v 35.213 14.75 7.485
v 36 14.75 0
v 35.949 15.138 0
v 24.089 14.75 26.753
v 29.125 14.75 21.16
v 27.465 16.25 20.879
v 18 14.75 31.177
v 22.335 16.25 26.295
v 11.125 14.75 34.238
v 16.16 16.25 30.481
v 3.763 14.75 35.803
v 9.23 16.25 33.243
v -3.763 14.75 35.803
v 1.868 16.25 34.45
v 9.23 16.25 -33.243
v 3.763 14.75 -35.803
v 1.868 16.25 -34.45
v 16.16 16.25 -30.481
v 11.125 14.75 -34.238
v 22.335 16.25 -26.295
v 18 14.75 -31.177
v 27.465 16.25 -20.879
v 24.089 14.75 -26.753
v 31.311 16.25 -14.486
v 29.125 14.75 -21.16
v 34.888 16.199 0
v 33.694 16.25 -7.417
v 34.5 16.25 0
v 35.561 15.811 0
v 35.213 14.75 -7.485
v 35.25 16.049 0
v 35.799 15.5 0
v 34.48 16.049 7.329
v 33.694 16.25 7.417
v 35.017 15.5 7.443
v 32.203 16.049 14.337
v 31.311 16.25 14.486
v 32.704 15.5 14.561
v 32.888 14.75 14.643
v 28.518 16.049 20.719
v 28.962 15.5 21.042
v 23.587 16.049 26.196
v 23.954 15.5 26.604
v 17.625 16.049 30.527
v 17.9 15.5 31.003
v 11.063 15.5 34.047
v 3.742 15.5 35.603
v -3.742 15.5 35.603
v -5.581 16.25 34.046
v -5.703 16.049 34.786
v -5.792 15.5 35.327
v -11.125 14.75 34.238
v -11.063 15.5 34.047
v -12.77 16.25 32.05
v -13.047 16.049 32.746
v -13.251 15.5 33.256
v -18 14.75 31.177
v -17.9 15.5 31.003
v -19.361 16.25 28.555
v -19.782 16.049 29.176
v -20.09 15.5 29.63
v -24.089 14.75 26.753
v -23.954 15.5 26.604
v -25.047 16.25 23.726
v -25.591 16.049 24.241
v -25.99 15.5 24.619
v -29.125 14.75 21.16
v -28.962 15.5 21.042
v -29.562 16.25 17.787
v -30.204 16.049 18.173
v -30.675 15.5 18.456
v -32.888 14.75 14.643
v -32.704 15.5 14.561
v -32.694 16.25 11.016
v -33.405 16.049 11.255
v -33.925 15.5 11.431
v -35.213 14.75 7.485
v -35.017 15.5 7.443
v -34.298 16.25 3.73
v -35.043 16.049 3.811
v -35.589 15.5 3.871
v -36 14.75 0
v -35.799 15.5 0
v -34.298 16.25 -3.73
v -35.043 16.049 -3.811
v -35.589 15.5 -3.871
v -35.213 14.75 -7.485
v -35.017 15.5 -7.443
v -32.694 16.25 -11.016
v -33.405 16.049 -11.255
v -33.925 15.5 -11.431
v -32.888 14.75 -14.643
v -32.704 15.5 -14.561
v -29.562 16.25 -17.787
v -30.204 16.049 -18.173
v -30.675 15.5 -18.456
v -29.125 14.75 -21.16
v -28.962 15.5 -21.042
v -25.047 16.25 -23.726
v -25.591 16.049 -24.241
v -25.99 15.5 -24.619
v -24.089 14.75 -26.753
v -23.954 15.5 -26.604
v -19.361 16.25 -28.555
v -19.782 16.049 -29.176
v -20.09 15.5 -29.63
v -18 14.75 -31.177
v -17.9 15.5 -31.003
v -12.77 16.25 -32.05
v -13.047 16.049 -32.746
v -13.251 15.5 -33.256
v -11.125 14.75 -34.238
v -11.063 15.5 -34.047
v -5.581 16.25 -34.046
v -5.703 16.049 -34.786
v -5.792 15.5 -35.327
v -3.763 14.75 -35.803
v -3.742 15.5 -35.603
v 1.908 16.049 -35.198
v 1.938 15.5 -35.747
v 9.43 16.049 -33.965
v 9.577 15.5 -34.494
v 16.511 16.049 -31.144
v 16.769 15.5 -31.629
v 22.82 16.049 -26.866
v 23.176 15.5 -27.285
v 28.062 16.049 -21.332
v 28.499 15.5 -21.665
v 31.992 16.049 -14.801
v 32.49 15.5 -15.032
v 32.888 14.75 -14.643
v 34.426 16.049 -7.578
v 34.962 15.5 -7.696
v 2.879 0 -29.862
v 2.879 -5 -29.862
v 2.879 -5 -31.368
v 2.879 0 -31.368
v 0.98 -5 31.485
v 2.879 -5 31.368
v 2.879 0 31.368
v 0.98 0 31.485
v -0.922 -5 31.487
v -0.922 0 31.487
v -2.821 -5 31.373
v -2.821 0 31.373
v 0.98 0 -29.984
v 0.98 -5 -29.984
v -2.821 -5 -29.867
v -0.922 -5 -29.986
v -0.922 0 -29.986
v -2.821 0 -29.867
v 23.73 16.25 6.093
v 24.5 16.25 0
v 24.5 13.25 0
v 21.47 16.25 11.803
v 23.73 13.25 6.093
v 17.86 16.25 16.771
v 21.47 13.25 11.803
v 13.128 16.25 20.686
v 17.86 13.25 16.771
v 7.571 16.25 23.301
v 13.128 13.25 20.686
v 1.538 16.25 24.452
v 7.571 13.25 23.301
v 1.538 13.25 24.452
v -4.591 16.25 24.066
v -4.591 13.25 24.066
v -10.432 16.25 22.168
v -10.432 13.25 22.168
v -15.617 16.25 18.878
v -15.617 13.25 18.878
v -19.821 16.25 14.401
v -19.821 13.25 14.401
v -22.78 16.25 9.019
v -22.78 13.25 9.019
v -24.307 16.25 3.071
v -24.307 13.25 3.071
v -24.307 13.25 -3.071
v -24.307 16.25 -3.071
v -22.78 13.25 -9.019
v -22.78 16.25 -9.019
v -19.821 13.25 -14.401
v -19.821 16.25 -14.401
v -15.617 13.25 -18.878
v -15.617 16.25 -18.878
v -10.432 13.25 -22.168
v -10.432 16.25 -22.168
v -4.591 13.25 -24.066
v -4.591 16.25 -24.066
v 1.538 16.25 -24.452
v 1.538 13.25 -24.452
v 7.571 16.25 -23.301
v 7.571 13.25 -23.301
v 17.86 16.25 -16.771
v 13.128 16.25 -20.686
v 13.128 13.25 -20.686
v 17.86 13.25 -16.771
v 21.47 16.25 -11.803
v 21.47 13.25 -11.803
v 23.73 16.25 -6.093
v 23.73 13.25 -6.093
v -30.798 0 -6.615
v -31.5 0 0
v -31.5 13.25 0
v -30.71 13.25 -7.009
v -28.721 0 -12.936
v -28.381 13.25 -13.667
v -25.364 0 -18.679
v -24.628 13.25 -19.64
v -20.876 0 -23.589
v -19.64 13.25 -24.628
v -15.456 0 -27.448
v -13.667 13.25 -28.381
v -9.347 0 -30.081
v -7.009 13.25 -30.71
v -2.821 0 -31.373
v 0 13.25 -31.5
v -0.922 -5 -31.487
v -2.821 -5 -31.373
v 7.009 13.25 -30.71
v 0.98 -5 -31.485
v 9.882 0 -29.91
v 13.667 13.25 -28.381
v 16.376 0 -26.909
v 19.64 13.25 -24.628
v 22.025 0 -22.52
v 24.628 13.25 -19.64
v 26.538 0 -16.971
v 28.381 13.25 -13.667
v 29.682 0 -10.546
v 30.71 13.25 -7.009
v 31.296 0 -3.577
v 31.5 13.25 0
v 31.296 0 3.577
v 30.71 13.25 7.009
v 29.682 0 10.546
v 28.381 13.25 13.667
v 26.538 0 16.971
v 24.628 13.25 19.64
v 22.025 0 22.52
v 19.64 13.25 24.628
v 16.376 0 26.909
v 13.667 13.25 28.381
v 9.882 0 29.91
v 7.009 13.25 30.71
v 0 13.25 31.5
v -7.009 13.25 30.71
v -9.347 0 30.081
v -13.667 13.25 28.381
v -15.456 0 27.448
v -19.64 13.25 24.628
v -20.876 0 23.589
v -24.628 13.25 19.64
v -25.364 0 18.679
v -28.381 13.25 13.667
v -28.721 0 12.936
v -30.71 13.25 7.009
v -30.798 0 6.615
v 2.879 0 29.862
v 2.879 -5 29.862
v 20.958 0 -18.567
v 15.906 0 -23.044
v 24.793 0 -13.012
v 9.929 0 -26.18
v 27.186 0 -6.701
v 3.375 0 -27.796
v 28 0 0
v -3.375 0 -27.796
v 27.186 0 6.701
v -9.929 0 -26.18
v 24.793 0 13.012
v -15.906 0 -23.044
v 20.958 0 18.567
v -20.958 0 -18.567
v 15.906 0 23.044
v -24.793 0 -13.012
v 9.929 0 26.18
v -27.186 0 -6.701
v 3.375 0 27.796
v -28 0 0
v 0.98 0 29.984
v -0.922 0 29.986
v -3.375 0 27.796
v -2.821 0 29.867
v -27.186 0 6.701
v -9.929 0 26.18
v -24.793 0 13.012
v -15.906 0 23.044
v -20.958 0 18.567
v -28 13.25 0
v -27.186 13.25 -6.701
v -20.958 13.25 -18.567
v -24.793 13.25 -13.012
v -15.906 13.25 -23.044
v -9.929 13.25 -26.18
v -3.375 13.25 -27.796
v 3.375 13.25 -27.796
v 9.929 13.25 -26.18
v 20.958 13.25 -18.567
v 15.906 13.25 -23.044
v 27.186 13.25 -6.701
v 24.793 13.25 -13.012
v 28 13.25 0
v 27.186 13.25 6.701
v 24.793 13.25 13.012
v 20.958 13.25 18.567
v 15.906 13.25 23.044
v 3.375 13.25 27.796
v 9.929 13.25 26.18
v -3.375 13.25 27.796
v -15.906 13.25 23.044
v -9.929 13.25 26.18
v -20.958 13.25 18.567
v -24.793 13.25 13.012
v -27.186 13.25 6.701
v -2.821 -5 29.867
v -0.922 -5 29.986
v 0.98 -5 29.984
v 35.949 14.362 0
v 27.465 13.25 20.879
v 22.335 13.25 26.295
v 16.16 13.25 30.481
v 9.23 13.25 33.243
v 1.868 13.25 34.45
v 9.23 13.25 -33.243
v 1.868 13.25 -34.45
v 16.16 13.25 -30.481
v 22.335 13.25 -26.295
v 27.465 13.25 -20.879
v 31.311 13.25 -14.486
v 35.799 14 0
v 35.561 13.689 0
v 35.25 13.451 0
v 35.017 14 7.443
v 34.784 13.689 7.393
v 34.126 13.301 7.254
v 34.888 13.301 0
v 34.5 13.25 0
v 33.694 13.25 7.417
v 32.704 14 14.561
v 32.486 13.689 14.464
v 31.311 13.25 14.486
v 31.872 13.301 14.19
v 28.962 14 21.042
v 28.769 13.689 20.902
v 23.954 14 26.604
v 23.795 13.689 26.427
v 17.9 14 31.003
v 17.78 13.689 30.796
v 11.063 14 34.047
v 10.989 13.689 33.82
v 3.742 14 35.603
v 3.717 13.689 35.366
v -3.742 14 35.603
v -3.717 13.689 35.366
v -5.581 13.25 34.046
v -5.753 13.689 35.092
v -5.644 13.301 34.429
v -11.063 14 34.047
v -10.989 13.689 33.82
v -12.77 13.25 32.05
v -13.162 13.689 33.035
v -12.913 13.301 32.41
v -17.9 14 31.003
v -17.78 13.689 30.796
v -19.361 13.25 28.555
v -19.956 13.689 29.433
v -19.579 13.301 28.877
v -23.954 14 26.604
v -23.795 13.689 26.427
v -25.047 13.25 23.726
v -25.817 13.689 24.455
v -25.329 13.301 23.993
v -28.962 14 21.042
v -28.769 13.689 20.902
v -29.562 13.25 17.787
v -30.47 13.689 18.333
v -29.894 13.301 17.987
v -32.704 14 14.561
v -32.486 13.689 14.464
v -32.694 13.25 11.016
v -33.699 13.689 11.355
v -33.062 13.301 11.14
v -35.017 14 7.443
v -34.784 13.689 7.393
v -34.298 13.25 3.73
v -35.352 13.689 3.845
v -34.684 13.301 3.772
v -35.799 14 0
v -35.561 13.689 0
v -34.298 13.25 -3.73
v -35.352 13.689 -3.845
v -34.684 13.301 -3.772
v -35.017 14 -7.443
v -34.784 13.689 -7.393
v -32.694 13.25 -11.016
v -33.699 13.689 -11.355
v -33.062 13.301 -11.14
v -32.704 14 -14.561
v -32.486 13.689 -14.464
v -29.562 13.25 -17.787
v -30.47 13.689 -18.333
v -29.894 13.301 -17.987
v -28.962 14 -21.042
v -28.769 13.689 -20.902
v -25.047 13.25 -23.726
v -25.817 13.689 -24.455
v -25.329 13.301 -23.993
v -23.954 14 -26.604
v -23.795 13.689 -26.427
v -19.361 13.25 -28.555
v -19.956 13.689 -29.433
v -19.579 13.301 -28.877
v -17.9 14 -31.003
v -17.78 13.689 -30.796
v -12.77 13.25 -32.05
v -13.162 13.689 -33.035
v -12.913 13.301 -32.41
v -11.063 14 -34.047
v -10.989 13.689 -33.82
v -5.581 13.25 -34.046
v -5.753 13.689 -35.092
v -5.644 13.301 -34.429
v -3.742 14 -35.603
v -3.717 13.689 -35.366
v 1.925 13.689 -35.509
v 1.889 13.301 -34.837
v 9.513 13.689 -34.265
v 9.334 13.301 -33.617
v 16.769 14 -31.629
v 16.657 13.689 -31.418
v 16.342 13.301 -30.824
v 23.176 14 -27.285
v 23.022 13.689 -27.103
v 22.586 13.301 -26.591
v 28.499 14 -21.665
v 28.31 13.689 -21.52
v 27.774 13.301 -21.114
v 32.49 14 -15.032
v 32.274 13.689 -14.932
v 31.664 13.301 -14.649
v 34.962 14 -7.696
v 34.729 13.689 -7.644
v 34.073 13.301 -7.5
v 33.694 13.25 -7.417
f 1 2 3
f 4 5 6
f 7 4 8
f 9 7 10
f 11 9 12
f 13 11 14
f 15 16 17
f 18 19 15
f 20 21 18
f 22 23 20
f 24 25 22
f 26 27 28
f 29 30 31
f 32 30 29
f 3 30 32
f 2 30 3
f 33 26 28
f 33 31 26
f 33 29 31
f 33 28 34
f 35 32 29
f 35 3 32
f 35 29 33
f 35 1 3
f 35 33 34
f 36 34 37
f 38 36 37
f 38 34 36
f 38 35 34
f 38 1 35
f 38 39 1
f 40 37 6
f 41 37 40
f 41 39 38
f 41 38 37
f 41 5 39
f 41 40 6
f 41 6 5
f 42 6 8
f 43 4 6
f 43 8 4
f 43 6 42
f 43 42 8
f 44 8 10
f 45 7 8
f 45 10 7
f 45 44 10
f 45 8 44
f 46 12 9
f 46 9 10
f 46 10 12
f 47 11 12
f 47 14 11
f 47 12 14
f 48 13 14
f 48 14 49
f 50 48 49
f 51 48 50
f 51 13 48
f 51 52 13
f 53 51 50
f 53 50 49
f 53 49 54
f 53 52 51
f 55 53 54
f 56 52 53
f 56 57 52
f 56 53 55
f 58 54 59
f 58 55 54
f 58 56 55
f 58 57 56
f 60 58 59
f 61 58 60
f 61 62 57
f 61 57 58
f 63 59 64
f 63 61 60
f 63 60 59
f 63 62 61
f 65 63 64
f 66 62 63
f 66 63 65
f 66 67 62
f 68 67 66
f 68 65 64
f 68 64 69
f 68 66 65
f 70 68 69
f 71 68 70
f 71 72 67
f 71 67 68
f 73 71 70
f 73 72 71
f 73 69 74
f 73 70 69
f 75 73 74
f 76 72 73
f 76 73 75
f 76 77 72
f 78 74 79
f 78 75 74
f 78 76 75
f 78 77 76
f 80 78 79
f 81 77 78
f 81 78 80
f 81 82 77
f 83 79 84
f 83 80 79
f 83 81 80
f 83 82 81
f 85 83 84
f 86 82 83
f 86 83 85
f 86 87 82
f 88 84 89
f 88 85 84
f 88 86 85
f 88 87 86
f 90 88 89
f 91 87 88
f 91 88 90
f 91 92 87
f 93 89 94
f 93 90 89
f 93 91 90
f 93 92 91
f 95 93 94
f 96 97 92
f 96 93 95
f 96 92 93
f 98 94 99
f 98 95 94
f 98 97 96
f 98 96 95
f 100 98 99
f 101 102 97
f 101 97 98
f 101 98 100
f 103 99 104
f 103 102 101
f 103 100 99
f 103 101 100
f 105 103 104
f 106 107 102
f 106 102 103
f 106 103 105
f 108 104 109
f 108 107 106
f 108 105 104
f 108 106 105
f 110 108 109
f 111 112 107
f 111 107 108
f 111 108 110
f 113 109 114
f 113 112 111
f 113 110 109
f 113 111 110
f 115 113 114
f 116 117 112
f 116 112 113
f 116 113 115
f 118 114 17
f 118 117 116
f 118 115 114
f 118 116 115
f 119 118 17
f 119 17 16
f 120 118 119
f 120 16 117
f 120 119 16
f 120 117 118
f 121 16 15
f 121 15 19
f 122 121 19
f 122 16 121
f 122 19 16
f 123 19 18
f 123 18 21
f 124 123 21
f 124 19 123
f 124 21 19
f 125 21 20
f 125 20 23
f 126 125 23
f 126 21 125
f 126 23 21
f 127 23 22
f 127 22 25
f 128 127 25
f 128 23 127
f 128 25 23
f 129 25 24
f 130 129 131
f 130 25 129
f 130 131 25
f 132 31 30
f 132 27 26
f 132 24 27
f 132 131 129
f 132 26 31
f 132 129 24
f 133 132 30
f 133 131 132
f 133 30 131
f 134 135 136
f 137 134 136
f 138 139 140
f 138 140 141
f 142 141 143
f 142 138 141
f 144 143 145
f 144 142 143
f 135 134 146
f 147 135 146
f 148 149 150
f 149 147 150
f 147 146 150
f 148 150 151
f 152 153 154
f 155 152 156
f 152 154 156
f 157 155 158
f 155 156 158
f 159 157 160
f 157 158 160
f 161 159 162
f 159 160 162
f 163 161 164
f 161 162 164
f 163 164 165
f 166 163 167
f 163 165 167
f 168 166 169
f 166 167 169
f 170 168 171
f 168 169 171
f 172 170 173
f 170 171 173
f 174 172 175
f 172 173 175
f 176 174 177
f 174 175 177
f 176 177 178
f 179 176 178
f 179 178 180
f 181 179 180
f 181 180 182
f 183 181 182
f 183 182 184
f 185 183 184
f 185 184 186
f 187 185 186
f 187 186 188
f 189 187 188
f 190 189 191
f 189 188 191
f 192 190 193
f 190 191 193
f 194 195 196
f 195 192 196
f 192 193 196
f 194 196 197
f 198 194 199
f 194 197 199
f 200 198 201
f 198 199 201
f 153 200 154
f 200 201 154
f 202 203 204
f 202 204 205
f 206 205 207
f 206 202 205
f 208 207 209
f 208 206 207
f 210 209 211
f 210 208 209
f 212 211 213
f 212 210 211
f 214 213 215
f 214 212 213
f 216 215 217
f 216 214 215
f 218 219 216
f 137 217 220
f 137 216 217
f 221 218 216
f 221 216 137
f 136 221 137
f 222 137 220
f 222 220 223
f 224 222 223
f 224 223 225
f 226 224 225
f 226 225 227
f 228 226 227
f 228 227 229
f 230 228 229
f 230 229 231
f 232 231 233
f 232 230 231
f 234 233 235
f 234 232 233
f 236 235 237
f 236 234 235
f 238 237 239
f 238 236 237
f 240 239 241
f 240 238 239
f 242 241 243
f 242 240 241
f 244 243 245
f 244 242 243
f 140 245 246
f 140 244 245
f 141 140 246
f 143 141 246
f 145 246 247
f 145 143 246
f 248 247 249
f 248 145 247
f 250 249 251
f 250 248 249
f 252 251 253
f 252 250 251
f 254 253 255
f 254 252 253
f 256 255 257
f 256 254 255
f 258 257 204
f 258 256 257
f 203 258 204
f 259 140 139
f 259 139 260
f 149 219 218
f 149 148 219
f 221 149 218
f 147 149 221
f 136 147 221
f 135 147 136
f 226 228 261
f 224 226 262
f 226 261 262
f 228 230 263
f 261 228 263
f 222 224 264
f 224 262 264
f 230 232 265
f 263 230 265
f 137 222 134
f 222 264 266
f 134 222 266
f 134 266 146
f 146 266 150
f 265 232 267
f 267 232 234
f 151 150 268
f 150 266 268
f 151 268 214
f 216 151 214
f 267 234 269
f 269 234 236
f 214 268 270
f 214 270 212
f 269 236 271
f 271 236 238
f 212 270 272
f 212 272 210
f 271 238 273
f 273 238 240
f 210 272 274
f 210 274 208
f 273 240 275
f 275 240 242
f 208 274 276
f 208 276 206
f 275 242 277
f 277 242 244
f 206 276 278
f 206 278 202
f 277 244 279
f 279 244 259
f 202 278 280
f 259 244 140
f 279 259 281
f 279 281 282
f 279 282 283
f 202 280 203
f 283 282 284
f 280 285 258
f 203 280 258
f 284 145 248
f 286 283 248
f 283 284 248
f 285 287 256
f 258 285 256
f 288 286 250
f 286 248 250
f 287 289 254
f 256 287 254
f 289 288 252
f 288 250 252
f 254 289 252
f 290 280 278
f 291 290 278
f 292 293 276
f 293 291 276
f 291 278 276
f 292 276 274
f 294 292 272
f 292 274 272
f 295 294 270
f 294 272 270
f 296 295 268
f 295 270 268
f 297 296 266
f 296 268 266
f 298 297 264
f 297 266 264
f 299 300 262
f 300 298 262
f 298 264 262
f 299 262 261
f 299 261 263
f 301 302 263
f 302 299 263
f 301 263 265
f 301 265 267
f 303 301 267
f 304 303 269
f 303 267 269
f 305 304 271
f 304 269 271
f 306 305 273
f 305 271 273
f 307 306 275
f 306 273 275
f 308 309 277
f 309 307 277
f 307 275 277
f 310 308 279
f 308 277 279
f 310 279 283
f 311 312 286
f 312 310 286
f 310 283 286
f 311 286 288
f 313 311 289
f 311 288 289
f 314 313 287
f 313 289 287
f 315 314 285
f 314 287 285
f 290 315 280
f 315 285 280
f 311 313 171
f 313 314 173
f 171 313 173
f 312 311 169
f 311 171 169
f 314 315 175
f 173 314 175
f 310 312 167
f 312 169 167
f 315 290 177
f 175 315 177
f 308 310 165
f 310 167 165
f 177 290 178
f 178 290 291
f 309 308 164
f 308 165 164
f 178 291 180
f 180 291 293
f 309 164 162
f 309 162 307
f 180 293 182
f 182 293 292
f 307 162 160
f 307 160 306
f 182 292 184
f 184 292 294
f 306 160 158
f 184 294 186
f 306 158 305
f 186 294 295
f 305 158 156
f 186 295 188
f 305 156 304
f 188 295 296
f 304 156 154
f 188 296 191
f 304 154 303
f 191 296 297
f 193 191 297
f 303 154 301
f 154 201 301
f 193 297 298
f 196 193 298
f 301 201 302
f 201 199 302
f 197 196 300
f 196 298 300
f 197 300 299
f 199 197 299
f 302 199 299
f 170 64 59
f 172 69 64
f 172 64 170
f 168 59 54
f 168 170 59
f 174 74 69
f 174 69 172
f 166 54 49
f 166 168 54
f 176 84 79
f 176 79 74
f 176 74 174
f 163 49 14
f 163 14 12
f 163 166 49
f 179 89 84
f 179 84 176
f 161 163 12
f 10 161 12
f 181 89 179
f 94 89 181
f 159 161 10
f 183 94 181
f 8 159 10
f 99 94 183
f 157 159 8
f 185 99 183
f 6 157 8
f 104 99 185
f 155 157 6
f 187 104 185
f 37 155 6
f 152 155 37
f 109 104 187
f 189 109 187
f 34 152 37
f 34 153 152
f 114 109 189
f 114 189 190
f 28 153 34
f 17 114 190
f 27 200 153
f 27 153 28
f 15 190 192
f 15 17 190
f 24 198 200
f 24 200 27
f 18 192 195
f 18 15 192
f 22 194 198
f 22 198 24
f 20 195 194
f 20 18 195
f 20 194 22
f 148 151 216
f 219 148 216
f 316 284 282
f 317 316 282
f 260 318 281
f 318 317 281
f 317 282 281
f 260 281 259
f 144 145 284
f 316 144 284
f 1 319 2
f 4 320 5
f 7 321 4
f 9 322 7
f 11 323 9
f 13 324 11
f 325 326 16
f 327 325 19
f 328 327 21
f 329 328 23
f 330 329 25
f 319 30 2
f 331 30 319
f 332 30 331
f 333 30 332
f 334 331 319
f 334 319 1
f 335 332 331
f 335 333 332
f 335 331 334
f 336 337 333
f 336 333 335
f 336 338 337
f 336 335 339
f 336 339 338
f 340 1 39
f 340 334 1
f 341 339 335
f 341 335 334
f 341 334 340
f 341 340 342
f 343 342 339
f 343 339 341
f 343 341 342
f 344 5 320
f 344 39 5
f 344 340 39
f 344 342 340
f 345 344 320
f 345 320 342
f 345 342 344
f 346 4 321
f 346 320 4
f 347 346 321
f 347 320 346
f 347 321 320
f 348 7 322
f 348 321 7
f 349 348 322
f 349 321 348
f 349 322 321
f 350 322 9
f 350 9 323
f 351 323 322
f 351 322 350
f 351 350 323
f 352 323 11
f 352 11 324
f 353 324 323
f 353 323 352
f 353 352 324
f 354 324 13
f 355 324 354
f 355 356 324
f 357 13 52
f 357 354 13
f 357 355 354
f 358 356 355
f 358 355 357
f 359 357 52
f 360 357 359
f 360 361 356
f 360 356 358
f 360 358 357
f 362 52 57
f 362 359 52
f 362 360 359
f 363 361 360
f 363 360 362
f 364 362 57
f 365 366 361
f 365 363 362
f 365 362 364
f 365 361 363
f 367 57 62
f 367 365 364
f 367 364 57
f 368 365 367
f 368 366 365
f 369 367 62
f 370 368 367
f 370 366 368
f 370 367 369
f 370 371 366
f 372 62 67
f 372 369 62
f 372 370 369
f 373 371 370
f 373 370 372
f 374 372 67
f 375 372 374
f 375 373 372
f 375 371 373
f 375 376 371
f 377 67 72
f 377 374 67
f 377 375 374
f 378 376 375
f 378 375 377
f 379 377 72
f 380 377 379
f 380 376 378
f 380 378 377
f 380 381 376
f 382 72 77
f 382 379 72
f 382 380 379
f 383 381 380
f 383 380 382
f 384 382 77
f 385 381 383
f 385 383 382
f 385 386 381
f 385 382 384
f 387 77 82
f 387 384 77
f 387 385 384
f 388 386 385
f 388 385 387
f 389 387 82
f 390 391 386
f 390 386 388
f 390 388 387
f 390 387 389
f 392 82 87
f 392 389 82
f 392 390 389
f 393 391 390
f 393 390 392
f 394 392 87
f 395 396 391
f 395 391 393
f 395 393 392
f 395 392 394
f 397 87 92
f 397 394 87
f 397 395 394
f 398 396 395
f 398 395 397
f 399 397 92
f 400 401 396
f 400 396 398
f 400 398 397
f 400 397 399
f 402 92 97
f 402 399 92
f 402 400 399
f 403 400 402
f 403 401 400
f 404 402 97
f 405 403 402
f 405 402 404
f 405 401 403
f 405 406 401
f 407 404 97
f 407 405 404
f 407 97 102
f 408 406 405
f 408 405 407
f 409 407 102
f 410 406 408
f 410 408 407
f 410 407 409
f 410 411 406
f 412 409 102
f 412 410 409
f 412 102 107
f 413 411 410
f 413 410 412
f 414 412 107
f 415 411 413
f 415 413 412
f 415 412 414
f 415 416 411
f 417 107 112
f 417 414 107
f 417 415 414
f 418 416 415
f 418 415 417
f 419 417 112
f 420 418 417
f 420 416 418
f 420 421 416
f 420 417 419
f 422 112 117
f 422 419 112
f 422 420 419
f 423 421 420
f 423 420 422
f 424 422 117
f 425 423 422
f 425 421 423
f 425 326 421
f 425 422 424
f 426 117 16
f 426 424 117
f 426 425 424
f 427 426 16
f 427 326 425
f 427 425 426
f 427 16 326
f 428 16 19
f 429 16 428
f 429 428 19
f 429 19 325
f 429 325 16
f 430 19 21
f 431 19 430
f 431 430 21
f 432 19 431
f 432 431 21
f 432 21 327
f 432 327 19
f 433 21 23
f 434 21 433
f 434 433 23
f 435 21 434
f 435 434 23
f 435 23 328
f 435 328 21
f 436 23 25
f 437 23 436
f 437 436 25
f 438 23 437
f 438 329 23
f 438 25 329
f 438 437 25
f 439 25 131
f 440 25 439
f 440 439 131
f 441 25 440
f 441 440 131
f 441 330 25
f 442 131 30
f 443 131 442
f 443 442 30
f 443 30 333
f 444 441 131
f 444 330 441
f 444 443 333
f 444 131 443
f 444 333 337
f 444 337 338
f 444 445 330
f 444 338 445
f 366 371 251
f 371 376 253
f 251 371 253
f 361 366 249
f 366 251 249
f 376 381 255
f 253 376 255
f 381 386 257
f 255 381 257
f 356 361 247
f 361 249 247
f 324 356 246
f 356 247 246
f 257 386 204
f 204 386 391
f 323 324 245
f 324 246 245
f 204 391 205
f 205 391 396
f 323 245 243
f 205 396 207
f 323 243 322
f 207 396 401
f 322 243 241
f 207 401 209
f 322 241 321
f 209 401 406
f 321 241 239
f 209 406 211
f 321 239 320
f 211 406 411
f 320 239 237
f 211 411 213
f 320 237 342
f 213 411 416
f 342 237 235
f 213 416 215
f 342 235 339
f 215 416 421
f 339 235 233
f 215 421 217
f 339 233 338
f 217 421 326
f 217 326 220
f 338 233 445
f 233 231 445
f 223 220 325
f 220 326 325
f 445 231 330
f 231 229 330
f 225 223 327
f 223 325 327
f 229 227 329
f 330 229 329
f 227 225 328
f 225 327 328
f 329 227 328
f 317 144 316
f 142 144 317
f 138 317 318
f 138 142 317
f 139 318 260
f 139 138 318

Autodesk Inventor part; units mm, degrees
ref_plane "YZ Plane" through (0, 0, 0) normal (1, 0, 0) x (0, 1, 0)
ref_plane "XZ Plane" through (0, 0, 0) normal (0, 1, 0) x (-1, 0, 0)
ref_plane "XY Plane" through (0, 0, 0) normal (0, 0, 1) x (1, 0, 0)
sketch "Sketch1" plane through (0, 0, 0) normal (0, 1, 0) x (-1, 0, 0)
  circle A0 centre (0, 0) radius 28
  line L0 (28, 0) -> (31.5, 0)
  circle A1 centre (0, 0) radius 31.5
  circle A2 centre (0, 0) radius 31.5
  circle A3 centre (0, 0) radius 31.5
  dimension "d0" = 56
  dimension "d1" = 3.5
extrude "Extrusion1" add sketch "Sketch1" along normal blind 13.25
sketch "Sketch2" plane through (0, 13.25, 0) normal (0, 1, 0) x (1, 0, 0)
  circle A0 centre (0, 0) radius 28 projected
  line L0 (0, -28) -> (0, -24.5)
  line L1 (0, -24.5) -> (0, -31.5)
  circle A1 centre (0, 0) radius 31.5 projected
  line L2 (0, -31.5) -> (0, -36)
  circle A2 centre (0, 0) radius 24.5
  circle A3 centre (0, 0) radius 36
  dimension "d4" = 3.5
  dimension "d5" = 4.5
extrude "Extrusion2" add sketch "Sketch2" along normal blind 3 contours A0 | A1 | A3
sketch "Sketch3" plane through (0, 0, 0) normal (0, -1, 0) x (1, 0, 0)
  circle A0 centre (0, 0) radius 31.5 projected
  line L0 (0.0291, 31.5) -> (0.0291, -31.5)
  line L1 (2.8791, 31.3681) -> (2.8791, -35.492)
  line L2 (-2.8209, 31.3734) -> (-2.8209, -35.492)
  circle A1 centre (0, 0) radius 31.5
  circle A2 centre (0, 0) radius 30
  point P0 (2.8791, 29.8615)
  point P1 (2.8791, 31.3681)
  point P2 (-2.8209, 31.3734)
  point P3 (-2.8209, 29.8671)
  point P4 (2.8791, -29.8615)
  point P5 (-2.8209, -29.8671)
  point P6 (-2.8209, -31.3734)
  point P7 (2.8791, -31.3681)
  dimension "d8" = 2.85
  dimension "d9" = 2.85
extrude "Extrusion3" add sketch "Sketch3" along normal blind 5 contours L1 A2 L0 A0 | A0 L0 A2 L1 | L0 A2 L2 A0 | A0 L2 A2 L0
fillet "Fillet1" radius 1.5 2 edges at (-36, 13.25, 0) (-36, 16.25, 0)
properties part number "vez-rotate"
